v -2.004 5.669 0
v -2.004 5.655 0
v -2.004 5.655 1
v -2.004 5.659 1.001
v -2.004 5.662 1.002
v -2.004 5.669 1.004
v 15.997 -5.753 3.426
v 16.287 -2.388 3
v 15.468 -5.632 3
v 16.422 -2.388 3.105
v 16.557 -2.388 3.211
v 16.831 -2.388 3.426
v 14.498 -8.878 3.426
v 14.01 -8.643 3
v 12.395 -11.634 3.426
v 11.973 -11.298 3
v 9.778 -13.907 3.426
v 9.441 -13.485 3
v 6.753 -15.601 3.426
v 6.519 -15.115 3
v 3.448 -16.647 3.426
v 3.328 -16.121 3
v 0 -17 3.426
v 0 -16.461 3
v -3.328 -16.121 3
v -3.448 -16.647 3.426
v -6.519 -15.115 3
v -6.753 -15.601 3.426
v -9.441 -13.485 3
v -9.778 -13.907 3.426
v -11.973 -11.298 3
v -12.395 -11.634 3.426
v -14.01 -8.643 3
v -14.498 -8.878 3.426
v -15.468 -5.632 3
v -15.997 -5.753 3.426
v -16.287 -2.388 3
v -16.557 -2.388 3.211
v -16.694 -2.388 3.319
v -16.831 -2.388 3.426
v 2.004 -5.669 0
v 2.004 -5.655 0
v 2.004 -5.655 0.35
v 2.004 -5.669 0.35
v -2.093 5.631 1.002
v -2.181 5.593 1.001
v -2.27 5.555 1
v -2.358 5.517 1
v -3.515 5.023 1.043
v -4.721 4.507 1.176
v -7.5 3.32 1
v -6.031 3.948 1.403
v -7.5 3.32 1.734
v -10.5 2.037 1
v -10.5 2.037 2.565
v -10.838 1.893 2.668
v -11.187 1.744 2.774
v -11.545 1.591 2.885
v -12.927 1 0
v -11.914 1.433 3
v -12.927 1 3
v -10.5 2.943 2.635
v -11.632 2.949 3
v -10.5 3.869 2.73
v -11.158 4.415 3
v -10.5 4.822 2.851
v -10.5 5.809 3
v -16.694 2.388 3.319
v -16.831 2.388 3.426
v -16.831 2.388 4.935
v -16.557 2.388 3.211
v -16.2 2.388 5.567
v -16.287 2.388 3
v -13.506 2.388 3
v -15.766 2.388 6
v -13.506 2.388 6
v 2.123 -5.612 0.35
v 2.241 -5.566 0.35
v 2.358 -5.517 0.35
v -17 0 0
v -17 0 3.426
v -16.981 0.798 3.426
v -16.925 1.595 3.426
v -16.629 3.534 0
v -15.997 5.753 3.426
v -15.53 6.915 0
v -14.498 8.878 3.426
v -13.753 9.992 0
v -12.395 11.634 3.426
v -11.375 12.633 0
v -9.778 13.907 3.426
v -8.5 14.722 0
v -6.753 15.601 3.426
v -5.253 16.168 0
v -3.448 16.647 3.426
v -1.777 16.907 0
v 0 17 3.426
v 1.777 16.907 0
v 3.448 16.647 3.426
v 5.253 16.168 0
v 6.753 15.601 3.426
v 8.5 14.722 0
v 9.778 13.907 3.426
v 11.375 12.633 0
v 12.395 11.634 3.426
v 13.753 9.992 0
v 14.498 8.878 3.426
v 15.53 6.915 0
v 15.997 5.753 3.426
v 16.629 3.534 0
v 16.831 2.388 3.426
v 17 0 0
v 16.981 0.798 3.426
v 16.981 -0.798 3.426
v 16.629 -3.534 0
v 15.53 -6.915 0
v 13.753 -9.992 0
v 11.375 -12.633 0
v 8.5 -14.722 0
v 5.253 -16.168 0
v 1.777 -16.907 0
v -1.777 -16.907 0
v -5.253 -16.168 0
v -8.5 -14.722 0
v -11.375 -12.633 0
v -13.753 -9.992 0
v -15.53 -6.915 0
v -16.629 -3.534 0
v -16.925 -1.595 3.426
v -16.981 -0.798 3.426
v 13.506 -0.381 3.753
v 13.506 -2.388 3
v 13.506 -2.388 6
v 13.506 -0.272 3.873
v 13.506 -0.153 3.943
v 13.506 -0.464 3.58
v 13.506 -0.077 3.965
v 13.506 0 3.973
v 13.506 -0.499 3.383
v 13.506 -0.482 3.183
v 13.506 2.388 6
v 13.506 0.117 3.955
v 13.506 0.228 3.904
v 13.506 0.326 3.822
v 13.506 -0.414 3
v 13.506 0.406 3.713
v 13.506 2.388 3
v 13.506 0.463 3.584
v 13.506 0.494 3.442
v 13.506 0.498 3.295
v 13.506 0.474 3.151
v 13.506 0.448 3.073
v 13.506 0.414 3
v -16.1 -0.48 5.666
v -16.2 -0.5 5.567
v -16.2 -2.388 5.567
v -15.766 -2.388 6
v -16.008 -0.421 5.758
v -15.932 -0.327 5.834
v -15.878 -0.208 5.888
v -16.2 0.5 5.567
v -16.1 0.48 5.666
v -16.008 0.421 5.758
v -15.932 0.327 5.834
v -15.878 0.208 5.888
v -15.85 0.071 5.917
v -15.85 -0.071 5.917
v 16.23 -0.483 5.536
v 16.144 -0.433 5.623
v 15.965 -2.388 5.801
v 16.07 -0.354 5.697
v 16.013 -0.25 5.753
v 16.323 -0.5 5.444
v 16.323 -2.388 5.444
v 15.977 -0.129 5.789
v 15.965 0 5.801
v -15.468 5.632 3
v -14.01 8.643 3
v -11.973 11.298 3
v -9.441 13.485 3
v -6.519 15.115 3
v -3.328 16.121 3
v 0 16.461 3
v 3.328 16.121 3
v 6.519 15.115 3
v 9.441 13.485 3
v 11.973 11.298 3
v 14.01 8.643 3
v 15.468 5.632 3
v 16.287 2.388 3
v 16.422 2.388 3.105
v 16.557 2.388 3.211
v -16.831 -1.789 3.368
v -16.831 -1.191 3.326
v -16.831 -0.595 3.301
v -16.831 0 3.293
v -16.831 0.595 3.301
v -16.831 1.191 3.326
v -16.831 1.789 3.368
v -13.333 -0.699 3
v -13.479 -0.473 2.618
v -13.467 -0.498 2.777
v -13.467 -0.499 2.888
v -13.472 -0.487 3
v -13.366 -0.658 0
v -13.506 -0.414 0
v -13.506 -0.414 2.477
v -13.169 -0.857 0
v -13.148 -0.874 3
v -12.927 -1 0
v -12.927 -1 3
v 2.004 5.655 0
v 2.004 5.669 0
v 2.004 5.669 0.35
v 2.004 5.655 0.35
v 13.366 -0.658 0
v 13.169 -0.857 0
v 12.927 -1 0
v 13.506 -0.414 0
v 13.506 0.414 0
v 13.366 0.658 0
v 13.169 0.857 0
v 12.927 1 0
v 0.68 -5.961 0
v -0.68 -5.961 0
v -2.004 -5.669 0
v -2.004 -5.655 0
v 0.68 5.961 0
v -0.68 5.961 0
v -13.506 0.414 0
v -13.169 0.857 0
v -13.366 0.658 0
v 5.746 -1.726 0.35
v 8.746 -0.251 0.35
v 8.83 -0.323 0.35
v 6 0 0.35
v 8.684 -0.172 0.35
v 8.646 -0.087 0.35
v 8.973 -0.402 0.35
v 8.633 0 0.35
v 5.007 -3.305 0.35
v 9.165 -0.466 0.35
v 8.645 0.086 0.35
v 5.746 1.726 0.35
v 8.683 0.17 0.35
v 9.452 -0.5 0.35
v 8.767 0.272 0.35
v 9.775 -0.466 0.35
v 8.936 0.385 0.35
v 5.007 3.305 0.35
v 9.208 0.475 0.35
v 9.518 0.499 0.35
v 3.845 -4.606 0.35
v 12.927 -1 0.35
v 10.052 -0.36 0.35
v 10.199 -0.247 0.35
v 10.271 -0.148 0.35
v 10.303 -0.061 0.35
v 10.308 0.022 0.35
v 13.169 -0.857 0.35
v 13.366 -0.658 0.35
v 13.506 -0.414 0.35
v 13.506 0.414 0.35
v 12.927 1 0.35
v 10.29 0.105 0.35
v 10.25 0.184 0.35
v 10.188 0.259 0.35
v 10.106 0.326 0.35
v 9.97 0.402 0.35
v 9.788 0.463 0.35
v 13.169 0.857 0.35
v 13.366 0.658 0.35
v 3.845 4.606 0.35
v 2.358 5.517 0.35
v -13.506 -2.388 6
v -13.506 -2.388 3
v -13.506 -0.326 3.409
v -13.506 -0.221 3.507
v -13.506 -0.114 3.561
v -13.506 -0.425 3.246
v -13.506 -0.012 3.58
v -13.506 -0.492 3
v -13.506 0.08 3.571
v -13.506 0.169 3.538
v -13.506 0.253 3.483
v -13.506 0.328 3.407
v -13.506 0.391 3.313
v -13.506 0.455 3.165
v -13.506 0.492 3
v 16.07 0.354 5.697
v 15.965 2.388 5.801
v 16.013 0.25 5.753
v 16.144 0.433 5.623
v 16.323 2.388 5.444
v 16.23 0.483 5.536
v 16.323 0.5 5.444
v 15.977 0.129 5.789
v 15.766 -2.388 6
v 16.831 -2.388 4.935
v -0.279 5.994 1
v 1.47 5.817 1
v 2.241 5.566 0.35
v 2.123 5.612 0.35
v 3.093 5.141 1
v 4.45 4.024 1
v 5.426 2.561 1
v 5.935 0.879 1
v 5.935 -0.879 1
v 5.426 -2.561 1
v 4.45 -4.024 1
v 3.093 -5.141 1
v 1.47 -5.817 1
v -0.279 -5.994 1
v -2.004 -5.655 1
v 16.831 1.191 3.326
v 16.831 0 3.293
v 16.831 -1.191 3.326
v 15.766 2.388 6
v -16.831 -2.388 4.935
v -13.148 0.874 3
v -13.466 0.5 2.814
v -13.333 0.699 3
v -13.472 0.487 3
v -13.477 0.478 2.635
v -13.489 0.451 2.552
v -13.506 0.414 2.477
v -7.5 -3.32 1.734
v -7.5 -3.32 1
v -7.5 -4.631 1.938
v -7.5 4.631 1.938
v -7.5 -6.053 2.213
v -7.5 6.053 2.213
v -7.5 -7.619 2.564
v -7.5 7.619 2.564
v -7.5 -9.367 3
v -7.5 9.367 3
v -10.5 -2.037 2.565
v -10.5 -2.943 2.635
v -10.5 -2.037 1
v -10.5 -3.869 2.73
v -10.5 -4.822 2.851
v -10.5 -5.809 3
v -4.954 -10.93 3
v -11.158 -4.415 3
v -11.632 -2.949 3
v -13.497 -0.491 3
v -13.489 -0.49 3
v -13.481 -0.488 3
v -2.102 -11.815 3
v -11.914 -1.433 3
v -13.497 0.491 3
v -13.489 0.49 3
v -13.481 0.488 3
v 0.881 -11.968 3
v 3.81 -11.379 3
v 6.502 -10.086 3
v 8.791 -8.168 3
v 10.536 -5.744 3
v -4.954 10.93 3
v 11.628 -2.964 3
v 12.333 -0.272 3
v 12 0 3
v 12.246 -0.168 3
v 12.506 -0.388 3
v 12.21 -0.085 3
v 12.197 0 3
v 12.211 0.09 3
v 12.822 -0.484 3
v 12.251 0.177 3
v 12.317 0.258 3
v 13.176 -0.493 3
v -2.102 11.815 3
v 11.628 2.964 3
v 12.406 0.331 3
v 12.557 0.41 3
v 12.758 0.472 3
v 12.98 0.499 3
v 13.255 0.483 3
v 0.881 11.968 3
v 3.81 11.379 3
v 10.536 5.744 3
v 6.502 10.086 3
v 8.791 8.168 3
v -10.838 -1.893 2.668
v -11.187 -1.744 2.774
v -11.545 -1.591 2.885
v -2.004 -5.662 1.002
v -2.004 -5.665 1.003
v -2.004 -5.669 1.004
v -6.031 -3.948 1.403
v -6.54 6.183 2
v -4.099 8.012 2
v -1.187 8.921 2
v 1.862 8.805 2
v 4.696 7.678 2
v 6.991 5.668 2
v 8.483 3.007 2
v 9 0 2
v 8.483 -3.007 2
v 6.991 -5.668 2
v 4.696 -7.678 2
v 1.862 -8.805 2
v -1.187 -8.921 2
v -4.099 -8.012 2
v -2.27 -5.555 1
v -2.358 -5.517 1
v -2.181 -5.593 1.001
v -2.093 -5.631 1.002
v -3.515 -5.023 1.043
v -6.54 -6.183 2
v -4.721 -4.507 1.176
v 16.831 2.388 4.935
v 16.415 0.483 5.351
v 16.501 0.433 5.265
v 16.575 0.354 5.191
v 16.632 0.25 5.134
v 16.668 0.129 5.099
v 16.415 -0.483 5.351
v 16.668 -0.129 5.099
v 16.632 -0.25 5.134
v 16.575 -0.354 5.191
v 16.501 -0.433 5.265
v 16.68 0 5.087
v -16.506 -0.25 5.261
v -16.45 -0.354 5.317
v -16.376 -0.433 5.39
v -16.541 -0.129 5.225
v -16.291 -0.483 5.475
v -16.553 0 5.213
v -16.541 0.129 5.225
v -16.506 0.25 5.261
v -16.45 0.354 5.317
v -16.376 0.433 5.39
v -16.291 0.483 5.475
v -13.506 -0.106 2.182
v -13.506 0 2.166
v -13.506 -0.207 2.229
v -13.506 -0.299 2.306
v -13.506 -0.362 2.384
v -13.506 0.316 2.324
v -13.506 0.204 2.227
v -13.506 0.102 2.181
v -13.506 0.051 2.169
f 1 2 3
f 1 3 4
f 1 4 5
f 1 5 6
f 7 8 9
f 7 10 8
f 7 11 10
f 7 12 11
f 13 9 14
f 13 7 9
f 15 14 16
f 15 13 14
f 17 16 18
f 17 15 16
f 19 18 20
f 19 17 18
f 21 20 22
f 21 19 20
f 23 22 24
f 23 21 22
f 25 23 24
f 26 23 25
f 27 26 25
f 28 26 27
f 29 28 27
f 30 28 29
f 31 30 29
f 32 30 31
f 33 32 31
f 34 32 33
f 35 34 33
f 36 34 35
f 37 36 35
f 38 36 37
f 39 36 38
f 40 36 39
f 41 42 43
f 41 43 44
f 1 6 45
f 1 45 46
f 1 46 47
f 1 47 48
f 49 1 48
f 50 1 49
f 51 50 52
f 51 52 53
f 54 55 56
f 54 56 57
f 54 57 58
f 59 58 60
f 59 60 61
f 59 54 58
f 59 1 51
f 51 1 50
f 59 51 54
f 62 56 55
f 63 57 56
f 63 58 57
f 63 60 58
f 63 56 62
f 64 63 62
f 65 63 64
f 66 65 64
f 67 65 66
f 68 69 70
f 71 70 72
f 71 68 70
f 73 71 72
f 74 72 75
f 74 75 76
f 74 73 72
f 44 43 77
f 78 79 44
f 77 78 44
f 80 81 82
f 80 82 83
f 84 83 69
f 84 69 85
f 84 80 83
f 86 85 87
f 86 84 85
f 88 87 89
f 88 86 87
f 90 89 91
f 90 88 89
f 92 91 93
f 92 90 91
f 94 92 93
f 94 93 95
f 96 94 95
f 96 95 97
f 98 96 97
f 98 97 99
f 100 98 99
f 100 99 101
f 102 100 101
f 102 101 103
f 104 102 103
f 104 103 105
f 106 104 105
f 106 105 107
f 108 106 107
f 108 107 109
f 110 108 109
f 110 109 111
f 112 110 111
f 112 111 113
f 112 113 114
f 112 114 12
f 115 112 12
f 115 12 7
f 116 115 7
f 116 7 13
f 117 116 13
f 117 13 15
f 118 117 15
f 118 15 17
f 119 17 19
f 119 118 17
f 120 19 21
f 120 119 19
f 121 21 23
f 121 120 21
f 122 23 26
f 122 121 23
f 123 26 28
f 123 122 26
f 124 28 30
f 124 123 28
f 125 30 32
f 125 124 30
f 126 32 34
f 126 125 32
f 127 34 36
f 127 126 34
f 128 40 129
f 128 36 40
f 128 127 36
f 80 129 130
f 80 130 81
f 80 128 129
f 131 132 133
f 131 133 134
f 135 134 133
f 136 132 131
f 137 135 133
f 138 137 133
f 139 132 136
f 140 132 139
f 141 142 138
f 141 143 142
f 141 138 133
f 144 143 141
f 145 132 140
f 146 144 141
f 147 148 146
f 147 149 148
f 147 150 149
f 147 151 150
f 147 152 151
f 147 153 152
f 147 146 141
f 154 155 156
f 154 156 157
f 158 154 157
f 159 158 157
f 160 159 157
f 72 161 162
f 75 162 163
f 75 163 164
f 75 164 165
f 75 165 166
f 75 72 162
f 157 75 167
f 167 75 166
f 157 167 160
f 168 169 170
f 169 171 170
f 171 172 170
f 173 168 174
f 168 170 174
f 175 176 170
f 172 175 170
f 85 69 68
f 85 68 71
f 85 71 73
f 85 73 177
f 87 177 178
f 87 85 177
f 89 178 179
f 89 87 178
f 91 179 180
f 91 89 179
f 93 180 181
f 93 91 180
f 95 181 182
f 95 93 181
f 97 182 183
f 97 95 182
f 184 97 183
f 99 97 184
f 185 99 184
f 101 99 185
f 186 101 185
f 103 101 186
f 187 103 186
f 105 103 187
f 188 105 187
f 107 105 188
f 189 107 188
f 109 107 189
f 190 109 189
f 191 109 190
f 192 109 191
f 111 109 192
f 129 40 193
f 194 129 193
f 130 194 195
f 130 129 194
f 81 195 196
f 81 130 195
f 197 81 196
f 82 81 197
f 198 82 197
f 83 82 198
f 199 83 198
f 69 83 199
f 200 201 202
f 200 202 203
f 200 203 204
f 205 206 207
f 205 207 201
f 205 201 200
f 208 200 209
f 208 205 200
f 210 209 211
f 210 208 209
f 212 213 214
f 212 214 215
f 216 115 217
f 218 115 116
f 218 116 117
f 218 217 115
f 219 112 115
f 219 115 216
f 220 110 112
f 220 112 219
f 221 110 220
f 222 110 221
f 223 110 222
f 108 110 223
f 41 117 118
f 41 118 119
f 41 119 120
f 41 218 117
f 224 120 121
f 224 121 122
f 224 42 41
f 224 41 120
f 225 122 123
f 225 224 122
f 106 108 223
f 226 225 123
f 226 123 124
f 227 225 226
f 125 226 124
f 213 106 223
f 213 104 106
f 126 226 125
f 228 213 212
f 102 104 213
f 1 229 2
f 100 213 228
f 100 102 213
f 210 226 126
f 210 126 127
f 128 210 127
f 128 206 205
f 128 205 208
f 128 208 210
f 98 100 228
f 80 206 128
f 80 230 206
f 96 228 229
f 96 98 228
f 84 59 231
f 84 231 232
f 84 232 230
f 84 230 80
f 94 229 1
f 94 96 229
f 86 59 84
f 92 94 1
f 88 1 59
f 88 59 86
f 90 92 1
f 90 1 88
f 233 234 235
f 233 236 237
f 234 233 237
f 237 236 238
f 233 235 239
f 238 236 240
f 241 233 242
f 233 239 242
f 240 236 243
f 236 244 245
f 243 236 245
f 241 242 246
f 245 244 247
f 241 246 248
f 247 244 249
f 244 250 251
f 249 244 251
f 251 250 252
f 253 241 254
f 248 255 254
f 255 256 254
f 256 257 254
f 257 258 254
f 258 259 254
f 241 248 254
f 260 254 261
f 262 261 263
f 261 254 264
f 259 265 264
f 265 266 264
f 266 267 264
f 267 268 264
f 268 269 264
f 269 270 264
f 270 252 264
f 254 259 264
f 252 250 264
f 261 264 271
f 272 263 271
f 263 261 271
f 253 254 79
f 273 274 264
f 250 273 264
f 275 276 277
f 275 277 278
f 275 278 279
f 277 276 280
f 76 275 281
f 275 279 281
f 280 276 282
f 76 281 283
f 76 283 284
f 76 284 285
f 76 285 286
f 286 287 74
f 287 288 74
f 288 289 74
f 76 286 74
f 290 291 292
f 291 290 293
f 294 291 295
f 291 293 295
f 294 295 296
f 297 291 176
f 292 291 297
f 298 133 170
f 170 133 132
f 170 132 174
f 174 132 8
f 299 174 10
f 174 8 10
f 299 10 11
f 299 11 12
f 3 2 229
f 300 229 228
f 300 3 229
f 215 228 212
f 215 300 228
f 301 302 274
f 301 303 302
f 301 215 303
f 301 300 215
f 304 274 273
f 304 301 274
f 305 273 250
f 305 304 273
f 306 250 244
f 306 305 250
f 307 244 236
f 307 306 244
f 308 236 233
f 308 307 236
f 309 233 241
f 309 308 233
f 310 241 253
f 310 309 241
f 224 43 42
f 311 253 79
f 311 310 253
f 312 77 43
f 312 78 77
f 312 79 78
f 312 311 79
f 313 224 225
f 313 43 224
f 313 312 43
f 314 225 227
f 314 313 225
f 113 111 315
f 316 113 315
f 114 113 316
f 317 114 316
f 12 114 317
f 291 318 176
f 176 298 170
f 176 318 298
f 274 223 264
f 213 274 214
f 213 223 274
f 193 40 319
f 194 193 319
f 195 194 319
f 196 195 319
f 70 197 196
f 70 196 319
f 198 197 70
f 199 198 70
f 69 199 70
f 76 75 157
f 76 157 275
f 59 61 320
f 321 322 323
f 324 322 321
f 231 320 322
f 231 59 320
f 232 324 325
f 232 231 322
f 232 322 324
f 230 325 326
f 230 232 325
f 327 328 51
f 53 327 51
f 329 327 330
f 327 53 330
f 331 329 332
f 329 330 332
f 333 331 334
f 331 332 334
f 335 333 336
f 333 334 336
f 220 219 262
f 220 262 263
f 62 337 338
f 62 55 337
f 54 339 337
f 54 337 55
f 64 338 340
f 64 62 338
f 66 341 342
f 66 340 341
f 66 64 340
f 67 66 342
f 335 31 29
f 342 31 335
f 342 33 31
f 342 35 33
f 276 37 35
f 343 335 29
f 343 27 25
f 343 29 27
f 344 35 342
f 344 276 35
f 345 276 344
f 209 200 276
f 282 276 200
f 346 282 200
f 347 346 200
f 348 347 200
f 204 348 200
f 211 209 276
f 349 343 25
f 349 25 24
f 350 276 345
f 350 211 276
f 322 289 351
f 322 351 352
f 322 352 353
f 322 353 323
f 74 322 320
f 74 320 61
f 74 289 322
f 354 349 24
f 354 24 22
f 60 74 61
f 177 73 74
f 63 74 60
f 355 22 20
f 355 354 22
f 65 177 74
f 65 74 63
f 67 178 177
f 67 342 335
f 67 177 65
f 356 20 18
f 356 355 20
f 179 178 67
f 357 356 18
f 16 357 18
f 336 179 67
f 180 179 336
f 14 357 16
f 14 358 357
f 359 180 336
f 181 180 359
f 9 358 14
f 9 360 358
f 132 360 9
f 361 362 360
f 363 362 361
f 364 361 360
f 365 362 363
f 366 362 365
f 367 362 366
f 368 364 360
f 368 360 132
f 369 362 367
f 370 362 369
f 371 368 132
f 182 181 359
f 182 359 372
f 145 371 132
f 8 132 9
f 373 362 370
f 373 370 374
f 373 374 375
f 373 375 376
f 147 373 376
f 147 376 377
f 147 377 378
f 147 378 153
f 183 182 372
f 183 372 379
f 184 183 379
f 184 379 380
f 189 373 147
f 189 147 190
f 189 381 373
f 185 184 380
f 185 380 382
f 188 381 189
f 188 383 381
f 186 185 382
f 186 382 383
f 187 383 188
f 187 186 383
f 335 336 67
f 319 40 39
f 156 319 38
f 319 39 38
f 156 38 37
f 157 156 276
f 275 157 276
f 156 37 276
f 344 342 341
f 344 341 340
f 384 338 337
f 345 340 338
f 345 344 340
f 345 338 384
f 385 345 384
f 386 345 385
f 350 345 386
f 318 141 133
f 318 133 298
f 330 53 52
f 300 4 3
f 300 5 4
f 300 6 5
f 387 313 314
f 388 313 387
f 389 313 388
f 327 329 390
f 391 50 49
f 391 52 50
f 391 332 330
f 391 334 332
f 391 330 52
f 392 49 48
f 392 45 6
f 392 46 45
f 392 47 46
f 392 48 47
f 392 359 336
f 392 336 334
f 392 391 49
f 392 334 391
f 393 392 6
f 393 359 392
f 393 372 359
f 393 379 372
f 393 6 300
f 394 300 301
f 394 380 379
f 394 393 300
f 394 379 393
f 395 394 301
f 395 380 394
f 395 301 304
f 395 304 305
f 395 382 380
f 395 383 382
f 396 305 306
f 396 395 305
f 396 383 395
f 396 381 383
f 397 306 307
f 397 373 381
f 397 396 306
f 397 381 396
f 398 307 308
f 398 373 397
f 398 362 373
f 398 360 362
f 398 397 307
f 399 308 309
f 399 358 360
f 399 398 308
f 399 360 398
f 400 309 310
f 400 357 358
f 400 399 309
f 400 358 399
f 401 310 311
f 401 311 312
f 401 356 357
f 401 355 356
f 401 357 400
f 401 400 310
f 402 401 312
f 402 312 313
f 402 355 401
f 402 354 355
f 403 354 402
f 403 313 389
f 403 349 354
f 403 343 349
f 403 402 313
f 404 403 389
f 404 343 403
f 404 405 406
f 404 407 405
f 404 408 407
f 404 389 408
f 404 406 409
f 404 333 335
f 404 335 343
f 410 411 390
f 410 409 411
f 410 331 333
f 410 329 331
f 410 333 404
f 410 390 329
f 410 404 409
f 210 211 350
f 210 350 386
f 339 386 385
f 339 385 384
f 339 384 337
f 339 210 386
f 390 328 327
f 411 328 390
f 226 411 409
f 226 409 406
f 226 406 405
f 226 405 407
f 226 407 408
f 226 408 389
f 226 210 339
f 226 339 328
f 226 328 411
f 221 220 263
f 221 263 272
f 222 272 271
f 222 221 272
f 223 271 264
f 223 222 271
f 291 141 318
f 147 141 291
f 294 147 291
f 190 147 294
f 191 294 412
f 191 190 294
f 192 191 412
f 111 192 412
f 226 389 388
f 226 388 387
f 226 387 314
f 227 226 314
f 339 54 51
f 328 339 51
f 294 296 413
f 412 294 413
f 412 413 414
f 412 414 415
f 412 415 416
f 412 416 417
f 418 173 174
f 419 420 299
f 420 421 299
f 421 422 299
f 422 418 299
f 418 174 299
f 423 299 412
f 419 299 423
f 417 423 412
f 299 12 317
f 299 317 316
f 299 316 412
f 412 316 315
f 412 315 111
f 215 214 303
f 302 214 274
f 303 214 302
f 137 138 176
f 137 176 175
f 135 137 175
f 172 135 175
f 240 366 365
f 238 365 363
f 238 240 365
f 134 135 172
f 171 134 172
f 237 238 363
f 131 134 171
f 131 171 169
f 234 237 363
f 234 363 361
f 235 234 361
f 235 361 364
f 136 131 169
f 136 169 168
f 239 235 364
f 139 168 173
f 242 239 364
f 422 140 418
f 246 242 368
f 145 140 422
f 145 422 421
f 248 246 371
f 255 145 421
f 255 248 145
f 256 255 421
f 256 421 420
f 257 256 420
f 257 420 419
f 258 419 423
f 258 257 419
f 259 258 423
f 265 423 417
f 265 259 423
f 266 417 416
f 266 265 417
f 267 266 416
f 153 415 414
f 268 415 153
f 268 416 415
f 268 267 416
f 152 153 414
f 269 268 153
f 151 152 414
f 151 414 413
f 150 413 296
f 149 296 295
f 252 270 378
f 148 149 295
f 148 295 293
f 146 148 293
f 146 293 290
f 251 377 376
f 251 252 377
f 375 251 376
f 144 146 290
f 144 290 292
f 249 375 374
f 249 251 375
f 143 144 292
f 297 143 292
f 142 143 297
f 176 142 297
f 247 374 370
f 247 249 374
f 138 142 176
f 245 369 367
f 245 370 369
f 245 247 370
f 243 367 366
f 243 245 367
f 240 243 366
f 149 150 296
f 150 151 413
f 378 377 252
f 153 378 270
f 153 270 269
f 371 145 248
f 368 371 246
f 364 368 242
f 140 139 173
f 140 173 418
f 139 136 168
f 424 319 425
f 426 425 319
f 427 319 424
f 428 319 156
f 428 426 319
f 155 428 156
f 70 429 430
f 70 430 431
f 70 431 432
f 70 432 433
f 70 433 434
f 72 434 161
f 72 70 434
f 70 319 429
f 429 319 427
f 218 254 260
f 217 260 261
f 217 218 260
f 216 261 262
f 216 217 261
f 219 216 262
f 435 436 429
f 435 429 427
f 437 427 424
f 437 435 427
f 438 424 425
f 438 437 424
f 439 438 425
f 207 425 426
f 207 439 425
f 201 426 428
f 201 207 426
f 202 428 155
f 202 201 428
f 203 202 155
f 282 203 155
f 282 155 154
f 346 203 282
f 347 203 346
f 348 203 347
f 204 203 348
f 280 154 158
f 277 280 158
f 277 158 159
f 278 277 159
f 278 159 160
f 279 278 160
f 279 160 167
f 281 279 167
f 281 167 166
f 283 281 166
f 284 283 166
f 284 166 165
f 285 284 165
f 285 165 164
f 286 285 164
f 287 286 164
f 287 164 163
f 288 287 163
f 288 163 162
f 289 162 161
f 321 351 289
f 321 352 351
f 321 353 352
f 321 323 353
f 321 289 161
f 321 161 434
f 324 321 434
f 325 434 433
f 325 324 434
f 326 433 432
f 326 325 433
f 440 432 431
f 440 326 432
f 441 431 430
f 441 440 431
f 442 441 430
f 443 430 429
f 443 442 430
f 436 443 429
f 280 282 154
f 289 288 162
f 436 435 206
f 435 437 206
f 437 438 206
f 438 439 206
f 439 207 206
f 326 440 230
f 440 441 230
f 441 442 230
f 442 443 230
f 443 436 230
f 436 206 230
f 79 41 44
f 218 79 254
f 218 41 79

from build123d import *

# Parameters (mm, degrees)
F3_DEPTH  = 0.35
F4_DEPTH  = 5
F5_W      = 3.3258799294
F5_H      = 4.7764119825
F6_DEPTH  = 6
F8_START  = 1
F7_W      = 3
F7_H      = 20.7612029826
F8_DEPTH  = 2
F12_DEPTH = 2.9


with BuildPart() as f1:
    # F0 (on Front) → F1 (revolve)
    with BuildSketch(Plane.XZ):
        Polygon((-6, 1), (-12, 3), (-16.4613984525, 3), (-17, 3), (-17, 0), (-6, 0), align=None)
        Polygon((-17, 3), (-16.4613984525, 3), (-17, 3.4264510032), align=None)
    revolve(axis=Axis((0, 0, 0.3460962325), (0, 0, -1)))

    # F2 (on Top) → F3 (cut)
    with BuildSketch(Plane.XY):
        with BuildLine():
            Line((12.9273881117, 1), (2.0039374787, 5.6685529396))
            Line((2.0039374787, 5.6685529396), (2.0039374787, -5.6685529396))
            Line((2.0039374787, -5.6685529396), (12.9273881117, -1))
            ThreePointArc((12.9273881117, -1), (13.5875019991, 0), (12.9273881117, 1))
        make_face()
    extrude(amount=F3_DEPTH, mode=Mode.SUBTRACT)

    # F2 (on Top) → F4 (cut)
    with BuildSketch(Plane.XY):
        with BuildLine():
            Line((-2.0039374787, -5.6685529396), (-2.0039374787, 5.6685529396))
            Line((-2.0039374787, 5.6685529396), (-12.9273881117, 1))
            ThreePointArc((-12.9273881117, 1), (-13.5875019991, 0), (-12.9273881117, -1))
            Line((-12.9273881117, -1), (-2.0039374787, -5.6685529396))
        make_face()
    extrude(amount=F4_DEPTH, mode=Mode.SUBTRACT)

    # F5 (on Top) → F6 (join)
    with BuildSketch(Plane.XY):
        with Locations((-15.1684732898, 0)):
            Rectangle(F5_W, F5_H)
        with Locations((15.1684732898, 0)):
            Rectangle(F5_W, F5_H)
    extrude(amount=F6_DEPTH)

    # F7 (on Top) → F8 (join)
    with BuildSketch(Plane.XY.offset(F8_START)):
        with Locations((-9, 0)):
            Rectangle(F7_W, F7_H)
    extrude(amount=F8_DEPTH)

    # F9 (on Front) → F10 (revolve, cut)
    with BuildSketch(Plane.XZ):
        Polygon((8.2996124042, 0.1023378446), (9, 0), (16.3225417007, 5.4439346324), (15.9651809612, 5.801295372), align=None)
        Polygon((15.9651809612, 5.801295372), (16.3225417007, 5.4439346324), (17.0113109052, 5.9559992515), (16.7064689267, 6.3524049994), align=None)
    revolve(axis=Axis((13.0056554526, 0, 2.9779996257), (0.802516509, 0, 0.5966299128)), mode=Mode.SUBTRACT)

    # F9 (on Front) → F11 (revolve, cut)
    with BuildSketch(Plane.XZ):
        Polygon((-16.7743696364, 6.1416257066), (-17.127923027, 5.7880723161), (-16.5531635221, 5.2133128111), (-16.1996101315, 5.5668662017), align=None)
        Polygon((-16.1996101315, 5.5668662017), (-16.5531635221, 5.2133128111), (-12.5092434766, 1.1693927656), (-12.155690086, 1.5229461562), align=None)
    revolve(axis=Axis((-14.4650298612, 0, 3.8322859314), (-0.7071067812, 0, 0.7071067812)), mode=Mode.SUBTRACT)

    # F9 (on Front) → F12 (cut, symmetric)
    with BuildSketch(Plane.XZ):
        Polygon((-16.5531635221, 5.2133128111), (-17.127923027, 5.7880723161), (-16.7743696364, 6.1416257066), (-16.1996101315, 5.5668662017), (-15.1436466258, 6.6228297073), (-17.0755104627, 8.5546935443), (-19.2268886647, 6.4033153423), (-17.2588344452, 4.507641888), align=None)
        Polygon((-16.7743696364, 6.1416257066), (-17.127923027, 5.7880723161), (-16.5531635221, 5.2133128111), (-16.1996101315, 5.5668662017), align=None)
        Polygon((15.9651809612, 5.801295372), (16.3225417007, 5.4439346324), (17.0113109052, 5.9559992515), (16.7064689267, 6.3524049994), align=None)
        Polygon((17.0113109052, 5.9559992515), (16.3225417007, 5.4439346324), (17.2588344452, 4.507641888), (19.2268886647, 6.4033153423), (17.0755104627, 8.5546935443), (15.1436466258, 6.6228297073), (15.9651809612, 5.801295372), (16.7064689267, 6.3524049994), align=None)
    extrude(amount=F12_DEPTH, both=True, mode=Mode.SUBTRACT)


solid = f1.part
